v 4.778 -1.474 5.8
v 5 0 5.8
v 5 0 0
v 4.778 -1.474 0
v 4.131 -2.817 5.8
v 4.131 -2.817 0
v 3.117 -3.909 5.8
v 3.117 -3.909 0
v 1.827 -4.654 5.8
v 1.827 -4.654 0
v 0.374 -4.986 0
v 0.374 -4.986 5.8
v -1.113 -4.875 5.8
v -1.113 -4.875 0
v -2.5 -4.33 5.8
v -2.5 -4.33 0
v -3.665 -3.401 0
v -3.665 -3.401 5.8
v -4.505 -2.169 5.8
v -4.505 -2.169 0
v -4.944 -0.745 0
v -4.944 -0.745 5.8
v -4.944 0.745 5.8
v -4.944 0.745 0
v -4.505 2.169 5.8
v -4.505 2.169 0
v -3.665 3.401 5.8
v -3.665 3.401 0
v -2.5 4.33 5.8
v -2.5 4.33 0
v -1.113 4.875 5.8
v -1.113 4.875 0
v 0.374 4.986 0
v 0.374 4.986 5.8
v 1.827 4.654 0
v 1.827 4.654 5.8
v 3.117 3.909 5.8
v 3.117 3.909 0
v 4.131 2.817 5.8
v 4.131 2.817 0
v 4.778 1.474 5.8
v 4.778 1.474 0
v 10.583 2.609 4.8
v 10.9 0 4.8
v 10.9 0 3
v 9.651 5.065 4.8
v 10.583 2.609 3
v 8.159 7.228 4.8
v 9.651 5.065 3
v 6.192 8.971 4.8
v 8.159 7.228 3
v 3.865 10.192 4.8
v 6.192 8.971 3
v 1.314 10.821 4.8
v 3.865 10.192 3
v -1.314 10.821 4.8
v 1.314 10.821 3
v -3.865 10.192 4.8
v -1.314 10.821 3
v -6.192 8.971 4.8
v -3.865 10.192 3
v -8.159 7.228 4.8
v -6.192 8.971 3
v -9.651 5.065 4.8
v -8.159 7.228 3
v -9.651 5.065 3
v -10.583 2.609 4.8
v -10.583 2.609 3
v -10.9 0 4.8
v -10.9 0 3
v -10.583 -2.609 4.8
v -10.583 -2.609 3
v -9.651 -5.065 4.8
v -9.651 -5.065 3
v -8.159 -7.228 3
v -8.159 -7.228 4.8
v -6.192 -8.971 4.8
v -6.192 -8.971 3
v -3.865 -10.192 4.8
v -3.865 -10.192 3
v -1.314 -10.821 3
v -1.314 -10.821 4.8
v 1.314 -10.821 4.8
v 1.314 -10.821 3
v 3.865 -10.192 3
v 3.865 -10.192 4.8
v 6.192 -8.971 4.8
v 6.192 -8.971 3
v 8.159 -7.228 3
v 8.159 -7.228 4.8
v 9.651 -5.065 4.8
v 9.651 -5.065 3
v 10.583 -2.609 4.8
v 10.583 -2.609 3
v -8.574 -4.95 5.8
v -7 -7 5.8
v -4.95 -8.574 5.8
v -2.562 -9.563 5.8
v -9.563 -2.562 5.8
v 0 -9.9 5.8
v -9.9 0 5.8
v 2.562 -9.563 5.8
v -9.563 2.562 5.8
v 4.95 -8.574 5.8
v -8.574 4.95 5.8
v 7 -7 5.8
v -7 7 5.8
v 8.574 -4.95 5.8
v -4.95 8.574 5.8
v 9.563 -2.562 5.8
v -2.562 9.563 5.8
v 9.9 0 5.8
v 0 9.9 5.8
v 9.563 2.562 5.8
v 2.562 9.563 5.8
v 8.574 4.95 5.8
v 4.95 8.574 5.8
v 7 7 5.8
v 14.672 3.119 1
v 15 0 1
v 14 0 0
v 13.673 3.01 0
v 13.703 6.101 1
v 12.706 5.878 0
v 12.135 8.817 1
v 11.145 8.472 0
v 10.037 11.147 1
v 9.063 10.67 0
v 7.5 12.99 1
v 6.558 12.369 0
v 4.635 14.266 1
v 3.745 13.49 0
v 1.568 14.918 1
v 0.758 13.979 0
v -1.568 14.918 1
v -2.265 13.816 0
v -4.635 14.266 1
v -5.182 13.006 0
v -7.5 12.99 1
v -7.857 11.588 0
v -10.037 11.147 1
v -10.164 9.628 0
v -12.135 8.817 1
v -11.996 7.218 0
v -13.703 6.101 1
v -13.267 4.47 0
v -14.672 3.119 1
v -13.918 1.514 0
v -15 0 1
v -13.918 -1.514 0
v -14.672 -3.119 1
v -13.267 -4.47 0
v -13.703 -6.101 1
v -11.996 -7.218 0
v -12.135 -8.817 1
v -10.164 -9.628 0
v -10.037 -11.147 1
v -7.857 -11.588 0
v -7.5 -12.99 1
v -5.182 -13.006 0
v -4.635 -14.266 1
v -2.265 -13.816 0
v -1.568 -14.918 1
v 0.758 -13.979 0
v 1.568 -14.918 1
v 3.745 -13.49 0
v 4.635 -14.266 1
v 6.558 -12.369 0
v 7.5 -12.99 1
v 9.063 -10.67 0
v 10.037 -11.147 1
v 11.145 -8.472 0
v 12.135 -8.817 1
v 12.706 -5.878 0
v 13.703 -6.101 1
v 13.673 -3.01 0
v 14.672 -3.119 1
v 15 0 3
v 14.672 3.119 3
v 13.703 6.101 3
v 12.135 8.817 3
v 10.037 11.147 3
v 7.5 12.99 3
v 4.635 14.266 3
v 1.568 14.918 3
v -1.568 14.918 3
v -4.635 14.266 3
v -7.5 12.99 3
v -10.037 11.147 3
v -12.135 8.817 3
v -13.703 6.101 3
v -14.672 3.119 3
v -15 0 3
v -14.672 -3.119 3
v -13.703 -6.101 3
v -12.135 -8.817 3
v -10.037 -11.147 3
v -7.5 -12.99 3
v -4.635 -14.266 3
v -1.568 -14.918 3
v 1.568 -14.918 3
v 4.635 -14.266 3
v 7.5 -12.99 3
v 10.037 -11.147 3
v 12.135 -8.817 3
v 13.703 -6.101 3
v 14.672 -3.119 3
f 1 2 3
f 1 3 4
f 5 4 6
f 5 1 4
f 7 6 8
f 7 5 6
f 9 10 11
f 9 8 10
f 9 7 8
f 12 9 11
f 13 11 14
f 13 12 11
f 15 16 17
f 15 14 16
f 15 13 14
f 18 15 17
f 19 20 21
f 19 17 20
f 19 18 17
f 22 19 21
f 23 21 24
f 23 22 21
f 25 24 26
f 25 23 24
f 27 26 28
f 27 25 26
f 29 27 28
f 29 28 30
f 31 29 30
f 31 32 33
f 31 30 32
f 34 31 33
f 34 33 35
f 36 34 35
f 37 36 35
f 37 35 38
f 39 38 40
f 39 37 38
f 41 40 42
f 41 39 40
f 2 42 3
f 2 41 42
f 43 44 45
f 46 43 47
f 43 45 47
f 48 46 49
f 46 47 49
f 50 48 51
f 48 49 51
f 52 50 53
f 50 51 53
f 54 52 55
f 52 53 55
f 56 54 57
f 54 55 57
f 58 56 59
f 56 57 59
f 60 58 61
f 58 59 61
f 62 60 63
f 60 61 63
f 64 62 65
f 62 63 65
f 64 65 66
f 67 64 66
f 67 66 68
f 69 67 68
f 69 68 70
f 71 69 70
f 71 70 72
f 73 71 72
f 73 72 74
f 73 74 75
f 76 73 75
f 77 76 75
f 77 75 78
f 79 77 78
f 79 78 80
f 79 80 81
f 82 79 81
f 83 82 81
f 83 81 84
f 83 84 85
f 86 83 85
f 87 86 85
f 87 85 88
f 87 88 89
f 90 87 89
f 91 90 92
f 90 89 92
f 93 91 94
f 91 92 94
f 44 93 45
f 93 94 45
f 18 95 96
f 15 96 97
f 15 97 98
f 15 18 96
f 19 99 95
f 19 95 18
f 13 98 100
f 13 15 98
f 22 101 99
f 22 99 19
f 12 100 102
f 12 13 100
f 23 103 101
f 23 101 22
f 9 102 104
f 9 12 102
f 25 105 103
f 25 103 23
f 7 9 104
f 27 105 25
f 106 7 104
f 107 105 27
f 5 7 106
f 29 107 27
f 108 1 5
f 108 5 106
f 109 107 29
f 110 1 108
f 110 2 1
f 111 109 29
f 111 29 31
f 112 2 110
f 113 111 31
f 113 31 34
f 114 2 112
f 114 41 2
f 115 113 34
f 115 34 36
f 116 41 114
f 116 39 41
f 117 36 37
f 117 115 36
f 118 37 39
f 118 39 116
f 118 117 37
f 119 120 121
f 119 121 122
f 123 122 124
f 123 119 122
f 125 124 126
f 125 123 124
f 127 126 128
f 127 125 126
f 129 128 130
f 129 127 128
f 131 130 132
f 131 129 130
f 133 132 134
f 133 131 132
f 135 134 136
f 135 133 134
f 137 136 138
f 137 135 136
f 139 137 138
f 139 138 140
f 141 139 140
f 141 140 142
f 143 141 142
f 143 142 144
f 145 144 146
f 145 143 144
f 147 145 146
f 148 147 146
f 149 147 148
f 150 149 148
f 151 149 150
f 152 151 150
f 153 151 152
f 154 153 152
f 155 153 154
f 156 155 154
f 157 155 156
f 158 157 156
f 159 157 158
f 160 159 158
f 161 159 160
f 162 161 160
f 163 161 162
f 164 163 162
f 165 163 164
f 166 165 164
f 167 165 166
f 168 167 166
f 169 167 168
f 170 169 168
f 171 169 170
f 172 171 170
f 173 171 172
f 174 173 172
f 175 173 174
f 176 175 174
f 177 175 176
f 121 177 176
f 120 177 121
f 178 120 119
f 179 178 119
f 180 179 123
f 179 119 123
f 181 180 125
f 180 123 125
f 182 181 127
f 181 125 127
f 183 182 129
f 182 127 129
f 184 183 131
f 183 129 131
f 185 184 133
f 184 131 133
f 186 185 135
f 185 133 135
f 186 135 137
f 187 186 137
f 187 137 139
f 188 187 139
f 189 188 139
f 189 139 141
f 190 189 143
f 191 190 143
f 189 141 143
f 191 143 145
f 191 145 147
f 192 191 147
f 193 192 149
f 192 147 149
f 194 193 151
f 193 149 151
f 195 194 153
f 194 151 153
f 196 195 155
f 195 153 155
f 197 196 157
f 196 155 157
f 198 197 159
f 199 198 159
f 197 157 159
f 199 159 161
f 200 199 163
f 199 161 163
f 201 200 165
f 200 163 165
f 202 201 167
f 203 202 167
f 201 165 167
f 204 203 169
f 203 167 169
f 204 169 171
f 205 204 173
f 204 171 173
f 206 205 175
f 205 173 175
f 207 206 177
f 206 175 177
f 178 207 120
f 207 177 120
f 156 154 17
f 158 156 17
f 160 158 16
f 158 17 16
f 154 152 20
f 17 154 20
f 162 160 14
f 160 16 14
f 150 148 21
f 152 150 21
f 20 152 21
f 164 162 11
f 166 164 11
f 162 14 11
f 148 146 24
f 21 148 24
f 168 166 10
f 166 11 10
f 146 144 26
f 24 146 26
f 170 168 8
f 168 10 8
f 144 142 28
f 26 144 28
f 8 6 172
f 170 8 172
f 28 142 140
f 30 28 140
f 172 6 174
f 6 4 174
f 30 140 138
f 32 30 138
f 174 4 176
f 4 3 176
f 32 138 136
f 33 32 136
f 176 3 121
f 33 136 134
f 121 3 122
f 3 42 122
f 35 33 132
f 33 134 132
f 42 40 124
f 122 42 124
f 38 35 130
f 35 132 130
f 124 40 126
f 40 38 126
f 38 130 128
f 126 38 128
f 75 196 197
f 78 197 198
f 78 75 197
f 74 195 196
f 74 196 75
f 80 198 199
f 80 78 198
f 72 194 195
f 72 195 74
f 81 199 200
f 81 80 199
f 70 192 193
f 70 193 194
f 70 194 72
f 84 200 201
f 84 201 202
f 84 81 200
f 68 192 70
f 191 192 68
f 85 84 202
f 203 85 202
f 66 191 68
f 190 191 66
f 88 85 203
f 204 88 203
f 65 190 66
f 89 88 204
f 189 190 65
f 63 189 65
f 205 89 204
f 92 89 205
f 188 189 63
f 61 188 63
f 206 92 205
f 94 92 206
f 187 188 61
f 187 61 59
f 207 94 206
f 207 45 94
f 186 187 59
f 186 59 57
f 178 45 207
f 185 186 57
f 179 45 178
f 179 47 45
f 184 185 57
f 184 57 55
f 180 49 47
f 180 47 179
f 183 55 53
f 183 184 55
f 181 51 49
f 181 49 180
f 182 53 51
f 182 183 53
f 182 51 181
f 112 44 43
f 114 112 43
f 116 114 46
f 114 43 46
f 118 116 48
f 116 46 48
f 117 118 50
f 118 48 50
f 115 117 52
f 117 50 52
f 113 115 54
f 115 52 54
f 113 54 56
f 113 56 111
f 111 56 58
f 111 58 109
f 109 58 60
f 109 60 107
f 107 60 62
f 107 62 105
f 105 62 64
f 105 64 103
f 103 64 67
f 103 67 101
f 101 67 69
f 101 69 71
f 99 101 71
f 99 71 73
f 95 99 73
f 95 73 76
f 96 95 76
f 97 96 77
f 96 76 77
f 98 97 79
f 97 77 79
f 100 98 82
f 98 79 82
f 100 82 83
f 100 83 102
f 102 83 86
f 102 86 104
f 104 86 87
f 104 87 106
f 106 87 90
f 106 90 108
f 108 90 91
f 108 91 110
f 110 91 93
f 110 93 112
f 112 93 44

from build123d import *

# Parameters (mm, degrees)
F0_R     = 15
F1_DEPTH = 3
F2_R     = 10.9
F2_R_2   = 5
F3_DEPTH = 5.8
F4_DEPTH = 25
F5_DEPTH = 40.4
F6_SIZE  = 1


with BuildPart() as f1:
    # F0 (on Top) → F1 (new body)
    with BuildSketch(Plane.XY):
        Circle(F0_R)
    extrude(amount=F1_DEPTH)

    # F2 (on Top) → F3 (join)
    with BuildSketch(Plane.XY):
        Circle(F2_R)
        Circle(F2_R_2, mode=Mode.SUBTRACT)
    extrude(amount=F3_DEPTH)

    # F4 (add): a face of the model
    f4_faces = [f1.faces().sort_by_distance(p)[0] for p in [
        (0, 0, 3),
    ]]
    extrude(f4_faces, amount=F4_DEPTH)

    # F5 (cut): a face of the model
    f5_faces = [f1.faces().sort_by_distance(p)[0] for p in [
        (0, 0, 28),
    ]]
    extrude(f5_faces, amount=-F5_DEPTH, mode=Mode.SUBTRACT)

    # F6
    f6_edges = [f1.edges().sort_by_distance(p)[0] for p in [
        (-15, 0, 0),
        (-10.9, 0, 5.8),
    ]]
    chamfer(f6_edges, length=F6_SIZE)


solid = f1.part
